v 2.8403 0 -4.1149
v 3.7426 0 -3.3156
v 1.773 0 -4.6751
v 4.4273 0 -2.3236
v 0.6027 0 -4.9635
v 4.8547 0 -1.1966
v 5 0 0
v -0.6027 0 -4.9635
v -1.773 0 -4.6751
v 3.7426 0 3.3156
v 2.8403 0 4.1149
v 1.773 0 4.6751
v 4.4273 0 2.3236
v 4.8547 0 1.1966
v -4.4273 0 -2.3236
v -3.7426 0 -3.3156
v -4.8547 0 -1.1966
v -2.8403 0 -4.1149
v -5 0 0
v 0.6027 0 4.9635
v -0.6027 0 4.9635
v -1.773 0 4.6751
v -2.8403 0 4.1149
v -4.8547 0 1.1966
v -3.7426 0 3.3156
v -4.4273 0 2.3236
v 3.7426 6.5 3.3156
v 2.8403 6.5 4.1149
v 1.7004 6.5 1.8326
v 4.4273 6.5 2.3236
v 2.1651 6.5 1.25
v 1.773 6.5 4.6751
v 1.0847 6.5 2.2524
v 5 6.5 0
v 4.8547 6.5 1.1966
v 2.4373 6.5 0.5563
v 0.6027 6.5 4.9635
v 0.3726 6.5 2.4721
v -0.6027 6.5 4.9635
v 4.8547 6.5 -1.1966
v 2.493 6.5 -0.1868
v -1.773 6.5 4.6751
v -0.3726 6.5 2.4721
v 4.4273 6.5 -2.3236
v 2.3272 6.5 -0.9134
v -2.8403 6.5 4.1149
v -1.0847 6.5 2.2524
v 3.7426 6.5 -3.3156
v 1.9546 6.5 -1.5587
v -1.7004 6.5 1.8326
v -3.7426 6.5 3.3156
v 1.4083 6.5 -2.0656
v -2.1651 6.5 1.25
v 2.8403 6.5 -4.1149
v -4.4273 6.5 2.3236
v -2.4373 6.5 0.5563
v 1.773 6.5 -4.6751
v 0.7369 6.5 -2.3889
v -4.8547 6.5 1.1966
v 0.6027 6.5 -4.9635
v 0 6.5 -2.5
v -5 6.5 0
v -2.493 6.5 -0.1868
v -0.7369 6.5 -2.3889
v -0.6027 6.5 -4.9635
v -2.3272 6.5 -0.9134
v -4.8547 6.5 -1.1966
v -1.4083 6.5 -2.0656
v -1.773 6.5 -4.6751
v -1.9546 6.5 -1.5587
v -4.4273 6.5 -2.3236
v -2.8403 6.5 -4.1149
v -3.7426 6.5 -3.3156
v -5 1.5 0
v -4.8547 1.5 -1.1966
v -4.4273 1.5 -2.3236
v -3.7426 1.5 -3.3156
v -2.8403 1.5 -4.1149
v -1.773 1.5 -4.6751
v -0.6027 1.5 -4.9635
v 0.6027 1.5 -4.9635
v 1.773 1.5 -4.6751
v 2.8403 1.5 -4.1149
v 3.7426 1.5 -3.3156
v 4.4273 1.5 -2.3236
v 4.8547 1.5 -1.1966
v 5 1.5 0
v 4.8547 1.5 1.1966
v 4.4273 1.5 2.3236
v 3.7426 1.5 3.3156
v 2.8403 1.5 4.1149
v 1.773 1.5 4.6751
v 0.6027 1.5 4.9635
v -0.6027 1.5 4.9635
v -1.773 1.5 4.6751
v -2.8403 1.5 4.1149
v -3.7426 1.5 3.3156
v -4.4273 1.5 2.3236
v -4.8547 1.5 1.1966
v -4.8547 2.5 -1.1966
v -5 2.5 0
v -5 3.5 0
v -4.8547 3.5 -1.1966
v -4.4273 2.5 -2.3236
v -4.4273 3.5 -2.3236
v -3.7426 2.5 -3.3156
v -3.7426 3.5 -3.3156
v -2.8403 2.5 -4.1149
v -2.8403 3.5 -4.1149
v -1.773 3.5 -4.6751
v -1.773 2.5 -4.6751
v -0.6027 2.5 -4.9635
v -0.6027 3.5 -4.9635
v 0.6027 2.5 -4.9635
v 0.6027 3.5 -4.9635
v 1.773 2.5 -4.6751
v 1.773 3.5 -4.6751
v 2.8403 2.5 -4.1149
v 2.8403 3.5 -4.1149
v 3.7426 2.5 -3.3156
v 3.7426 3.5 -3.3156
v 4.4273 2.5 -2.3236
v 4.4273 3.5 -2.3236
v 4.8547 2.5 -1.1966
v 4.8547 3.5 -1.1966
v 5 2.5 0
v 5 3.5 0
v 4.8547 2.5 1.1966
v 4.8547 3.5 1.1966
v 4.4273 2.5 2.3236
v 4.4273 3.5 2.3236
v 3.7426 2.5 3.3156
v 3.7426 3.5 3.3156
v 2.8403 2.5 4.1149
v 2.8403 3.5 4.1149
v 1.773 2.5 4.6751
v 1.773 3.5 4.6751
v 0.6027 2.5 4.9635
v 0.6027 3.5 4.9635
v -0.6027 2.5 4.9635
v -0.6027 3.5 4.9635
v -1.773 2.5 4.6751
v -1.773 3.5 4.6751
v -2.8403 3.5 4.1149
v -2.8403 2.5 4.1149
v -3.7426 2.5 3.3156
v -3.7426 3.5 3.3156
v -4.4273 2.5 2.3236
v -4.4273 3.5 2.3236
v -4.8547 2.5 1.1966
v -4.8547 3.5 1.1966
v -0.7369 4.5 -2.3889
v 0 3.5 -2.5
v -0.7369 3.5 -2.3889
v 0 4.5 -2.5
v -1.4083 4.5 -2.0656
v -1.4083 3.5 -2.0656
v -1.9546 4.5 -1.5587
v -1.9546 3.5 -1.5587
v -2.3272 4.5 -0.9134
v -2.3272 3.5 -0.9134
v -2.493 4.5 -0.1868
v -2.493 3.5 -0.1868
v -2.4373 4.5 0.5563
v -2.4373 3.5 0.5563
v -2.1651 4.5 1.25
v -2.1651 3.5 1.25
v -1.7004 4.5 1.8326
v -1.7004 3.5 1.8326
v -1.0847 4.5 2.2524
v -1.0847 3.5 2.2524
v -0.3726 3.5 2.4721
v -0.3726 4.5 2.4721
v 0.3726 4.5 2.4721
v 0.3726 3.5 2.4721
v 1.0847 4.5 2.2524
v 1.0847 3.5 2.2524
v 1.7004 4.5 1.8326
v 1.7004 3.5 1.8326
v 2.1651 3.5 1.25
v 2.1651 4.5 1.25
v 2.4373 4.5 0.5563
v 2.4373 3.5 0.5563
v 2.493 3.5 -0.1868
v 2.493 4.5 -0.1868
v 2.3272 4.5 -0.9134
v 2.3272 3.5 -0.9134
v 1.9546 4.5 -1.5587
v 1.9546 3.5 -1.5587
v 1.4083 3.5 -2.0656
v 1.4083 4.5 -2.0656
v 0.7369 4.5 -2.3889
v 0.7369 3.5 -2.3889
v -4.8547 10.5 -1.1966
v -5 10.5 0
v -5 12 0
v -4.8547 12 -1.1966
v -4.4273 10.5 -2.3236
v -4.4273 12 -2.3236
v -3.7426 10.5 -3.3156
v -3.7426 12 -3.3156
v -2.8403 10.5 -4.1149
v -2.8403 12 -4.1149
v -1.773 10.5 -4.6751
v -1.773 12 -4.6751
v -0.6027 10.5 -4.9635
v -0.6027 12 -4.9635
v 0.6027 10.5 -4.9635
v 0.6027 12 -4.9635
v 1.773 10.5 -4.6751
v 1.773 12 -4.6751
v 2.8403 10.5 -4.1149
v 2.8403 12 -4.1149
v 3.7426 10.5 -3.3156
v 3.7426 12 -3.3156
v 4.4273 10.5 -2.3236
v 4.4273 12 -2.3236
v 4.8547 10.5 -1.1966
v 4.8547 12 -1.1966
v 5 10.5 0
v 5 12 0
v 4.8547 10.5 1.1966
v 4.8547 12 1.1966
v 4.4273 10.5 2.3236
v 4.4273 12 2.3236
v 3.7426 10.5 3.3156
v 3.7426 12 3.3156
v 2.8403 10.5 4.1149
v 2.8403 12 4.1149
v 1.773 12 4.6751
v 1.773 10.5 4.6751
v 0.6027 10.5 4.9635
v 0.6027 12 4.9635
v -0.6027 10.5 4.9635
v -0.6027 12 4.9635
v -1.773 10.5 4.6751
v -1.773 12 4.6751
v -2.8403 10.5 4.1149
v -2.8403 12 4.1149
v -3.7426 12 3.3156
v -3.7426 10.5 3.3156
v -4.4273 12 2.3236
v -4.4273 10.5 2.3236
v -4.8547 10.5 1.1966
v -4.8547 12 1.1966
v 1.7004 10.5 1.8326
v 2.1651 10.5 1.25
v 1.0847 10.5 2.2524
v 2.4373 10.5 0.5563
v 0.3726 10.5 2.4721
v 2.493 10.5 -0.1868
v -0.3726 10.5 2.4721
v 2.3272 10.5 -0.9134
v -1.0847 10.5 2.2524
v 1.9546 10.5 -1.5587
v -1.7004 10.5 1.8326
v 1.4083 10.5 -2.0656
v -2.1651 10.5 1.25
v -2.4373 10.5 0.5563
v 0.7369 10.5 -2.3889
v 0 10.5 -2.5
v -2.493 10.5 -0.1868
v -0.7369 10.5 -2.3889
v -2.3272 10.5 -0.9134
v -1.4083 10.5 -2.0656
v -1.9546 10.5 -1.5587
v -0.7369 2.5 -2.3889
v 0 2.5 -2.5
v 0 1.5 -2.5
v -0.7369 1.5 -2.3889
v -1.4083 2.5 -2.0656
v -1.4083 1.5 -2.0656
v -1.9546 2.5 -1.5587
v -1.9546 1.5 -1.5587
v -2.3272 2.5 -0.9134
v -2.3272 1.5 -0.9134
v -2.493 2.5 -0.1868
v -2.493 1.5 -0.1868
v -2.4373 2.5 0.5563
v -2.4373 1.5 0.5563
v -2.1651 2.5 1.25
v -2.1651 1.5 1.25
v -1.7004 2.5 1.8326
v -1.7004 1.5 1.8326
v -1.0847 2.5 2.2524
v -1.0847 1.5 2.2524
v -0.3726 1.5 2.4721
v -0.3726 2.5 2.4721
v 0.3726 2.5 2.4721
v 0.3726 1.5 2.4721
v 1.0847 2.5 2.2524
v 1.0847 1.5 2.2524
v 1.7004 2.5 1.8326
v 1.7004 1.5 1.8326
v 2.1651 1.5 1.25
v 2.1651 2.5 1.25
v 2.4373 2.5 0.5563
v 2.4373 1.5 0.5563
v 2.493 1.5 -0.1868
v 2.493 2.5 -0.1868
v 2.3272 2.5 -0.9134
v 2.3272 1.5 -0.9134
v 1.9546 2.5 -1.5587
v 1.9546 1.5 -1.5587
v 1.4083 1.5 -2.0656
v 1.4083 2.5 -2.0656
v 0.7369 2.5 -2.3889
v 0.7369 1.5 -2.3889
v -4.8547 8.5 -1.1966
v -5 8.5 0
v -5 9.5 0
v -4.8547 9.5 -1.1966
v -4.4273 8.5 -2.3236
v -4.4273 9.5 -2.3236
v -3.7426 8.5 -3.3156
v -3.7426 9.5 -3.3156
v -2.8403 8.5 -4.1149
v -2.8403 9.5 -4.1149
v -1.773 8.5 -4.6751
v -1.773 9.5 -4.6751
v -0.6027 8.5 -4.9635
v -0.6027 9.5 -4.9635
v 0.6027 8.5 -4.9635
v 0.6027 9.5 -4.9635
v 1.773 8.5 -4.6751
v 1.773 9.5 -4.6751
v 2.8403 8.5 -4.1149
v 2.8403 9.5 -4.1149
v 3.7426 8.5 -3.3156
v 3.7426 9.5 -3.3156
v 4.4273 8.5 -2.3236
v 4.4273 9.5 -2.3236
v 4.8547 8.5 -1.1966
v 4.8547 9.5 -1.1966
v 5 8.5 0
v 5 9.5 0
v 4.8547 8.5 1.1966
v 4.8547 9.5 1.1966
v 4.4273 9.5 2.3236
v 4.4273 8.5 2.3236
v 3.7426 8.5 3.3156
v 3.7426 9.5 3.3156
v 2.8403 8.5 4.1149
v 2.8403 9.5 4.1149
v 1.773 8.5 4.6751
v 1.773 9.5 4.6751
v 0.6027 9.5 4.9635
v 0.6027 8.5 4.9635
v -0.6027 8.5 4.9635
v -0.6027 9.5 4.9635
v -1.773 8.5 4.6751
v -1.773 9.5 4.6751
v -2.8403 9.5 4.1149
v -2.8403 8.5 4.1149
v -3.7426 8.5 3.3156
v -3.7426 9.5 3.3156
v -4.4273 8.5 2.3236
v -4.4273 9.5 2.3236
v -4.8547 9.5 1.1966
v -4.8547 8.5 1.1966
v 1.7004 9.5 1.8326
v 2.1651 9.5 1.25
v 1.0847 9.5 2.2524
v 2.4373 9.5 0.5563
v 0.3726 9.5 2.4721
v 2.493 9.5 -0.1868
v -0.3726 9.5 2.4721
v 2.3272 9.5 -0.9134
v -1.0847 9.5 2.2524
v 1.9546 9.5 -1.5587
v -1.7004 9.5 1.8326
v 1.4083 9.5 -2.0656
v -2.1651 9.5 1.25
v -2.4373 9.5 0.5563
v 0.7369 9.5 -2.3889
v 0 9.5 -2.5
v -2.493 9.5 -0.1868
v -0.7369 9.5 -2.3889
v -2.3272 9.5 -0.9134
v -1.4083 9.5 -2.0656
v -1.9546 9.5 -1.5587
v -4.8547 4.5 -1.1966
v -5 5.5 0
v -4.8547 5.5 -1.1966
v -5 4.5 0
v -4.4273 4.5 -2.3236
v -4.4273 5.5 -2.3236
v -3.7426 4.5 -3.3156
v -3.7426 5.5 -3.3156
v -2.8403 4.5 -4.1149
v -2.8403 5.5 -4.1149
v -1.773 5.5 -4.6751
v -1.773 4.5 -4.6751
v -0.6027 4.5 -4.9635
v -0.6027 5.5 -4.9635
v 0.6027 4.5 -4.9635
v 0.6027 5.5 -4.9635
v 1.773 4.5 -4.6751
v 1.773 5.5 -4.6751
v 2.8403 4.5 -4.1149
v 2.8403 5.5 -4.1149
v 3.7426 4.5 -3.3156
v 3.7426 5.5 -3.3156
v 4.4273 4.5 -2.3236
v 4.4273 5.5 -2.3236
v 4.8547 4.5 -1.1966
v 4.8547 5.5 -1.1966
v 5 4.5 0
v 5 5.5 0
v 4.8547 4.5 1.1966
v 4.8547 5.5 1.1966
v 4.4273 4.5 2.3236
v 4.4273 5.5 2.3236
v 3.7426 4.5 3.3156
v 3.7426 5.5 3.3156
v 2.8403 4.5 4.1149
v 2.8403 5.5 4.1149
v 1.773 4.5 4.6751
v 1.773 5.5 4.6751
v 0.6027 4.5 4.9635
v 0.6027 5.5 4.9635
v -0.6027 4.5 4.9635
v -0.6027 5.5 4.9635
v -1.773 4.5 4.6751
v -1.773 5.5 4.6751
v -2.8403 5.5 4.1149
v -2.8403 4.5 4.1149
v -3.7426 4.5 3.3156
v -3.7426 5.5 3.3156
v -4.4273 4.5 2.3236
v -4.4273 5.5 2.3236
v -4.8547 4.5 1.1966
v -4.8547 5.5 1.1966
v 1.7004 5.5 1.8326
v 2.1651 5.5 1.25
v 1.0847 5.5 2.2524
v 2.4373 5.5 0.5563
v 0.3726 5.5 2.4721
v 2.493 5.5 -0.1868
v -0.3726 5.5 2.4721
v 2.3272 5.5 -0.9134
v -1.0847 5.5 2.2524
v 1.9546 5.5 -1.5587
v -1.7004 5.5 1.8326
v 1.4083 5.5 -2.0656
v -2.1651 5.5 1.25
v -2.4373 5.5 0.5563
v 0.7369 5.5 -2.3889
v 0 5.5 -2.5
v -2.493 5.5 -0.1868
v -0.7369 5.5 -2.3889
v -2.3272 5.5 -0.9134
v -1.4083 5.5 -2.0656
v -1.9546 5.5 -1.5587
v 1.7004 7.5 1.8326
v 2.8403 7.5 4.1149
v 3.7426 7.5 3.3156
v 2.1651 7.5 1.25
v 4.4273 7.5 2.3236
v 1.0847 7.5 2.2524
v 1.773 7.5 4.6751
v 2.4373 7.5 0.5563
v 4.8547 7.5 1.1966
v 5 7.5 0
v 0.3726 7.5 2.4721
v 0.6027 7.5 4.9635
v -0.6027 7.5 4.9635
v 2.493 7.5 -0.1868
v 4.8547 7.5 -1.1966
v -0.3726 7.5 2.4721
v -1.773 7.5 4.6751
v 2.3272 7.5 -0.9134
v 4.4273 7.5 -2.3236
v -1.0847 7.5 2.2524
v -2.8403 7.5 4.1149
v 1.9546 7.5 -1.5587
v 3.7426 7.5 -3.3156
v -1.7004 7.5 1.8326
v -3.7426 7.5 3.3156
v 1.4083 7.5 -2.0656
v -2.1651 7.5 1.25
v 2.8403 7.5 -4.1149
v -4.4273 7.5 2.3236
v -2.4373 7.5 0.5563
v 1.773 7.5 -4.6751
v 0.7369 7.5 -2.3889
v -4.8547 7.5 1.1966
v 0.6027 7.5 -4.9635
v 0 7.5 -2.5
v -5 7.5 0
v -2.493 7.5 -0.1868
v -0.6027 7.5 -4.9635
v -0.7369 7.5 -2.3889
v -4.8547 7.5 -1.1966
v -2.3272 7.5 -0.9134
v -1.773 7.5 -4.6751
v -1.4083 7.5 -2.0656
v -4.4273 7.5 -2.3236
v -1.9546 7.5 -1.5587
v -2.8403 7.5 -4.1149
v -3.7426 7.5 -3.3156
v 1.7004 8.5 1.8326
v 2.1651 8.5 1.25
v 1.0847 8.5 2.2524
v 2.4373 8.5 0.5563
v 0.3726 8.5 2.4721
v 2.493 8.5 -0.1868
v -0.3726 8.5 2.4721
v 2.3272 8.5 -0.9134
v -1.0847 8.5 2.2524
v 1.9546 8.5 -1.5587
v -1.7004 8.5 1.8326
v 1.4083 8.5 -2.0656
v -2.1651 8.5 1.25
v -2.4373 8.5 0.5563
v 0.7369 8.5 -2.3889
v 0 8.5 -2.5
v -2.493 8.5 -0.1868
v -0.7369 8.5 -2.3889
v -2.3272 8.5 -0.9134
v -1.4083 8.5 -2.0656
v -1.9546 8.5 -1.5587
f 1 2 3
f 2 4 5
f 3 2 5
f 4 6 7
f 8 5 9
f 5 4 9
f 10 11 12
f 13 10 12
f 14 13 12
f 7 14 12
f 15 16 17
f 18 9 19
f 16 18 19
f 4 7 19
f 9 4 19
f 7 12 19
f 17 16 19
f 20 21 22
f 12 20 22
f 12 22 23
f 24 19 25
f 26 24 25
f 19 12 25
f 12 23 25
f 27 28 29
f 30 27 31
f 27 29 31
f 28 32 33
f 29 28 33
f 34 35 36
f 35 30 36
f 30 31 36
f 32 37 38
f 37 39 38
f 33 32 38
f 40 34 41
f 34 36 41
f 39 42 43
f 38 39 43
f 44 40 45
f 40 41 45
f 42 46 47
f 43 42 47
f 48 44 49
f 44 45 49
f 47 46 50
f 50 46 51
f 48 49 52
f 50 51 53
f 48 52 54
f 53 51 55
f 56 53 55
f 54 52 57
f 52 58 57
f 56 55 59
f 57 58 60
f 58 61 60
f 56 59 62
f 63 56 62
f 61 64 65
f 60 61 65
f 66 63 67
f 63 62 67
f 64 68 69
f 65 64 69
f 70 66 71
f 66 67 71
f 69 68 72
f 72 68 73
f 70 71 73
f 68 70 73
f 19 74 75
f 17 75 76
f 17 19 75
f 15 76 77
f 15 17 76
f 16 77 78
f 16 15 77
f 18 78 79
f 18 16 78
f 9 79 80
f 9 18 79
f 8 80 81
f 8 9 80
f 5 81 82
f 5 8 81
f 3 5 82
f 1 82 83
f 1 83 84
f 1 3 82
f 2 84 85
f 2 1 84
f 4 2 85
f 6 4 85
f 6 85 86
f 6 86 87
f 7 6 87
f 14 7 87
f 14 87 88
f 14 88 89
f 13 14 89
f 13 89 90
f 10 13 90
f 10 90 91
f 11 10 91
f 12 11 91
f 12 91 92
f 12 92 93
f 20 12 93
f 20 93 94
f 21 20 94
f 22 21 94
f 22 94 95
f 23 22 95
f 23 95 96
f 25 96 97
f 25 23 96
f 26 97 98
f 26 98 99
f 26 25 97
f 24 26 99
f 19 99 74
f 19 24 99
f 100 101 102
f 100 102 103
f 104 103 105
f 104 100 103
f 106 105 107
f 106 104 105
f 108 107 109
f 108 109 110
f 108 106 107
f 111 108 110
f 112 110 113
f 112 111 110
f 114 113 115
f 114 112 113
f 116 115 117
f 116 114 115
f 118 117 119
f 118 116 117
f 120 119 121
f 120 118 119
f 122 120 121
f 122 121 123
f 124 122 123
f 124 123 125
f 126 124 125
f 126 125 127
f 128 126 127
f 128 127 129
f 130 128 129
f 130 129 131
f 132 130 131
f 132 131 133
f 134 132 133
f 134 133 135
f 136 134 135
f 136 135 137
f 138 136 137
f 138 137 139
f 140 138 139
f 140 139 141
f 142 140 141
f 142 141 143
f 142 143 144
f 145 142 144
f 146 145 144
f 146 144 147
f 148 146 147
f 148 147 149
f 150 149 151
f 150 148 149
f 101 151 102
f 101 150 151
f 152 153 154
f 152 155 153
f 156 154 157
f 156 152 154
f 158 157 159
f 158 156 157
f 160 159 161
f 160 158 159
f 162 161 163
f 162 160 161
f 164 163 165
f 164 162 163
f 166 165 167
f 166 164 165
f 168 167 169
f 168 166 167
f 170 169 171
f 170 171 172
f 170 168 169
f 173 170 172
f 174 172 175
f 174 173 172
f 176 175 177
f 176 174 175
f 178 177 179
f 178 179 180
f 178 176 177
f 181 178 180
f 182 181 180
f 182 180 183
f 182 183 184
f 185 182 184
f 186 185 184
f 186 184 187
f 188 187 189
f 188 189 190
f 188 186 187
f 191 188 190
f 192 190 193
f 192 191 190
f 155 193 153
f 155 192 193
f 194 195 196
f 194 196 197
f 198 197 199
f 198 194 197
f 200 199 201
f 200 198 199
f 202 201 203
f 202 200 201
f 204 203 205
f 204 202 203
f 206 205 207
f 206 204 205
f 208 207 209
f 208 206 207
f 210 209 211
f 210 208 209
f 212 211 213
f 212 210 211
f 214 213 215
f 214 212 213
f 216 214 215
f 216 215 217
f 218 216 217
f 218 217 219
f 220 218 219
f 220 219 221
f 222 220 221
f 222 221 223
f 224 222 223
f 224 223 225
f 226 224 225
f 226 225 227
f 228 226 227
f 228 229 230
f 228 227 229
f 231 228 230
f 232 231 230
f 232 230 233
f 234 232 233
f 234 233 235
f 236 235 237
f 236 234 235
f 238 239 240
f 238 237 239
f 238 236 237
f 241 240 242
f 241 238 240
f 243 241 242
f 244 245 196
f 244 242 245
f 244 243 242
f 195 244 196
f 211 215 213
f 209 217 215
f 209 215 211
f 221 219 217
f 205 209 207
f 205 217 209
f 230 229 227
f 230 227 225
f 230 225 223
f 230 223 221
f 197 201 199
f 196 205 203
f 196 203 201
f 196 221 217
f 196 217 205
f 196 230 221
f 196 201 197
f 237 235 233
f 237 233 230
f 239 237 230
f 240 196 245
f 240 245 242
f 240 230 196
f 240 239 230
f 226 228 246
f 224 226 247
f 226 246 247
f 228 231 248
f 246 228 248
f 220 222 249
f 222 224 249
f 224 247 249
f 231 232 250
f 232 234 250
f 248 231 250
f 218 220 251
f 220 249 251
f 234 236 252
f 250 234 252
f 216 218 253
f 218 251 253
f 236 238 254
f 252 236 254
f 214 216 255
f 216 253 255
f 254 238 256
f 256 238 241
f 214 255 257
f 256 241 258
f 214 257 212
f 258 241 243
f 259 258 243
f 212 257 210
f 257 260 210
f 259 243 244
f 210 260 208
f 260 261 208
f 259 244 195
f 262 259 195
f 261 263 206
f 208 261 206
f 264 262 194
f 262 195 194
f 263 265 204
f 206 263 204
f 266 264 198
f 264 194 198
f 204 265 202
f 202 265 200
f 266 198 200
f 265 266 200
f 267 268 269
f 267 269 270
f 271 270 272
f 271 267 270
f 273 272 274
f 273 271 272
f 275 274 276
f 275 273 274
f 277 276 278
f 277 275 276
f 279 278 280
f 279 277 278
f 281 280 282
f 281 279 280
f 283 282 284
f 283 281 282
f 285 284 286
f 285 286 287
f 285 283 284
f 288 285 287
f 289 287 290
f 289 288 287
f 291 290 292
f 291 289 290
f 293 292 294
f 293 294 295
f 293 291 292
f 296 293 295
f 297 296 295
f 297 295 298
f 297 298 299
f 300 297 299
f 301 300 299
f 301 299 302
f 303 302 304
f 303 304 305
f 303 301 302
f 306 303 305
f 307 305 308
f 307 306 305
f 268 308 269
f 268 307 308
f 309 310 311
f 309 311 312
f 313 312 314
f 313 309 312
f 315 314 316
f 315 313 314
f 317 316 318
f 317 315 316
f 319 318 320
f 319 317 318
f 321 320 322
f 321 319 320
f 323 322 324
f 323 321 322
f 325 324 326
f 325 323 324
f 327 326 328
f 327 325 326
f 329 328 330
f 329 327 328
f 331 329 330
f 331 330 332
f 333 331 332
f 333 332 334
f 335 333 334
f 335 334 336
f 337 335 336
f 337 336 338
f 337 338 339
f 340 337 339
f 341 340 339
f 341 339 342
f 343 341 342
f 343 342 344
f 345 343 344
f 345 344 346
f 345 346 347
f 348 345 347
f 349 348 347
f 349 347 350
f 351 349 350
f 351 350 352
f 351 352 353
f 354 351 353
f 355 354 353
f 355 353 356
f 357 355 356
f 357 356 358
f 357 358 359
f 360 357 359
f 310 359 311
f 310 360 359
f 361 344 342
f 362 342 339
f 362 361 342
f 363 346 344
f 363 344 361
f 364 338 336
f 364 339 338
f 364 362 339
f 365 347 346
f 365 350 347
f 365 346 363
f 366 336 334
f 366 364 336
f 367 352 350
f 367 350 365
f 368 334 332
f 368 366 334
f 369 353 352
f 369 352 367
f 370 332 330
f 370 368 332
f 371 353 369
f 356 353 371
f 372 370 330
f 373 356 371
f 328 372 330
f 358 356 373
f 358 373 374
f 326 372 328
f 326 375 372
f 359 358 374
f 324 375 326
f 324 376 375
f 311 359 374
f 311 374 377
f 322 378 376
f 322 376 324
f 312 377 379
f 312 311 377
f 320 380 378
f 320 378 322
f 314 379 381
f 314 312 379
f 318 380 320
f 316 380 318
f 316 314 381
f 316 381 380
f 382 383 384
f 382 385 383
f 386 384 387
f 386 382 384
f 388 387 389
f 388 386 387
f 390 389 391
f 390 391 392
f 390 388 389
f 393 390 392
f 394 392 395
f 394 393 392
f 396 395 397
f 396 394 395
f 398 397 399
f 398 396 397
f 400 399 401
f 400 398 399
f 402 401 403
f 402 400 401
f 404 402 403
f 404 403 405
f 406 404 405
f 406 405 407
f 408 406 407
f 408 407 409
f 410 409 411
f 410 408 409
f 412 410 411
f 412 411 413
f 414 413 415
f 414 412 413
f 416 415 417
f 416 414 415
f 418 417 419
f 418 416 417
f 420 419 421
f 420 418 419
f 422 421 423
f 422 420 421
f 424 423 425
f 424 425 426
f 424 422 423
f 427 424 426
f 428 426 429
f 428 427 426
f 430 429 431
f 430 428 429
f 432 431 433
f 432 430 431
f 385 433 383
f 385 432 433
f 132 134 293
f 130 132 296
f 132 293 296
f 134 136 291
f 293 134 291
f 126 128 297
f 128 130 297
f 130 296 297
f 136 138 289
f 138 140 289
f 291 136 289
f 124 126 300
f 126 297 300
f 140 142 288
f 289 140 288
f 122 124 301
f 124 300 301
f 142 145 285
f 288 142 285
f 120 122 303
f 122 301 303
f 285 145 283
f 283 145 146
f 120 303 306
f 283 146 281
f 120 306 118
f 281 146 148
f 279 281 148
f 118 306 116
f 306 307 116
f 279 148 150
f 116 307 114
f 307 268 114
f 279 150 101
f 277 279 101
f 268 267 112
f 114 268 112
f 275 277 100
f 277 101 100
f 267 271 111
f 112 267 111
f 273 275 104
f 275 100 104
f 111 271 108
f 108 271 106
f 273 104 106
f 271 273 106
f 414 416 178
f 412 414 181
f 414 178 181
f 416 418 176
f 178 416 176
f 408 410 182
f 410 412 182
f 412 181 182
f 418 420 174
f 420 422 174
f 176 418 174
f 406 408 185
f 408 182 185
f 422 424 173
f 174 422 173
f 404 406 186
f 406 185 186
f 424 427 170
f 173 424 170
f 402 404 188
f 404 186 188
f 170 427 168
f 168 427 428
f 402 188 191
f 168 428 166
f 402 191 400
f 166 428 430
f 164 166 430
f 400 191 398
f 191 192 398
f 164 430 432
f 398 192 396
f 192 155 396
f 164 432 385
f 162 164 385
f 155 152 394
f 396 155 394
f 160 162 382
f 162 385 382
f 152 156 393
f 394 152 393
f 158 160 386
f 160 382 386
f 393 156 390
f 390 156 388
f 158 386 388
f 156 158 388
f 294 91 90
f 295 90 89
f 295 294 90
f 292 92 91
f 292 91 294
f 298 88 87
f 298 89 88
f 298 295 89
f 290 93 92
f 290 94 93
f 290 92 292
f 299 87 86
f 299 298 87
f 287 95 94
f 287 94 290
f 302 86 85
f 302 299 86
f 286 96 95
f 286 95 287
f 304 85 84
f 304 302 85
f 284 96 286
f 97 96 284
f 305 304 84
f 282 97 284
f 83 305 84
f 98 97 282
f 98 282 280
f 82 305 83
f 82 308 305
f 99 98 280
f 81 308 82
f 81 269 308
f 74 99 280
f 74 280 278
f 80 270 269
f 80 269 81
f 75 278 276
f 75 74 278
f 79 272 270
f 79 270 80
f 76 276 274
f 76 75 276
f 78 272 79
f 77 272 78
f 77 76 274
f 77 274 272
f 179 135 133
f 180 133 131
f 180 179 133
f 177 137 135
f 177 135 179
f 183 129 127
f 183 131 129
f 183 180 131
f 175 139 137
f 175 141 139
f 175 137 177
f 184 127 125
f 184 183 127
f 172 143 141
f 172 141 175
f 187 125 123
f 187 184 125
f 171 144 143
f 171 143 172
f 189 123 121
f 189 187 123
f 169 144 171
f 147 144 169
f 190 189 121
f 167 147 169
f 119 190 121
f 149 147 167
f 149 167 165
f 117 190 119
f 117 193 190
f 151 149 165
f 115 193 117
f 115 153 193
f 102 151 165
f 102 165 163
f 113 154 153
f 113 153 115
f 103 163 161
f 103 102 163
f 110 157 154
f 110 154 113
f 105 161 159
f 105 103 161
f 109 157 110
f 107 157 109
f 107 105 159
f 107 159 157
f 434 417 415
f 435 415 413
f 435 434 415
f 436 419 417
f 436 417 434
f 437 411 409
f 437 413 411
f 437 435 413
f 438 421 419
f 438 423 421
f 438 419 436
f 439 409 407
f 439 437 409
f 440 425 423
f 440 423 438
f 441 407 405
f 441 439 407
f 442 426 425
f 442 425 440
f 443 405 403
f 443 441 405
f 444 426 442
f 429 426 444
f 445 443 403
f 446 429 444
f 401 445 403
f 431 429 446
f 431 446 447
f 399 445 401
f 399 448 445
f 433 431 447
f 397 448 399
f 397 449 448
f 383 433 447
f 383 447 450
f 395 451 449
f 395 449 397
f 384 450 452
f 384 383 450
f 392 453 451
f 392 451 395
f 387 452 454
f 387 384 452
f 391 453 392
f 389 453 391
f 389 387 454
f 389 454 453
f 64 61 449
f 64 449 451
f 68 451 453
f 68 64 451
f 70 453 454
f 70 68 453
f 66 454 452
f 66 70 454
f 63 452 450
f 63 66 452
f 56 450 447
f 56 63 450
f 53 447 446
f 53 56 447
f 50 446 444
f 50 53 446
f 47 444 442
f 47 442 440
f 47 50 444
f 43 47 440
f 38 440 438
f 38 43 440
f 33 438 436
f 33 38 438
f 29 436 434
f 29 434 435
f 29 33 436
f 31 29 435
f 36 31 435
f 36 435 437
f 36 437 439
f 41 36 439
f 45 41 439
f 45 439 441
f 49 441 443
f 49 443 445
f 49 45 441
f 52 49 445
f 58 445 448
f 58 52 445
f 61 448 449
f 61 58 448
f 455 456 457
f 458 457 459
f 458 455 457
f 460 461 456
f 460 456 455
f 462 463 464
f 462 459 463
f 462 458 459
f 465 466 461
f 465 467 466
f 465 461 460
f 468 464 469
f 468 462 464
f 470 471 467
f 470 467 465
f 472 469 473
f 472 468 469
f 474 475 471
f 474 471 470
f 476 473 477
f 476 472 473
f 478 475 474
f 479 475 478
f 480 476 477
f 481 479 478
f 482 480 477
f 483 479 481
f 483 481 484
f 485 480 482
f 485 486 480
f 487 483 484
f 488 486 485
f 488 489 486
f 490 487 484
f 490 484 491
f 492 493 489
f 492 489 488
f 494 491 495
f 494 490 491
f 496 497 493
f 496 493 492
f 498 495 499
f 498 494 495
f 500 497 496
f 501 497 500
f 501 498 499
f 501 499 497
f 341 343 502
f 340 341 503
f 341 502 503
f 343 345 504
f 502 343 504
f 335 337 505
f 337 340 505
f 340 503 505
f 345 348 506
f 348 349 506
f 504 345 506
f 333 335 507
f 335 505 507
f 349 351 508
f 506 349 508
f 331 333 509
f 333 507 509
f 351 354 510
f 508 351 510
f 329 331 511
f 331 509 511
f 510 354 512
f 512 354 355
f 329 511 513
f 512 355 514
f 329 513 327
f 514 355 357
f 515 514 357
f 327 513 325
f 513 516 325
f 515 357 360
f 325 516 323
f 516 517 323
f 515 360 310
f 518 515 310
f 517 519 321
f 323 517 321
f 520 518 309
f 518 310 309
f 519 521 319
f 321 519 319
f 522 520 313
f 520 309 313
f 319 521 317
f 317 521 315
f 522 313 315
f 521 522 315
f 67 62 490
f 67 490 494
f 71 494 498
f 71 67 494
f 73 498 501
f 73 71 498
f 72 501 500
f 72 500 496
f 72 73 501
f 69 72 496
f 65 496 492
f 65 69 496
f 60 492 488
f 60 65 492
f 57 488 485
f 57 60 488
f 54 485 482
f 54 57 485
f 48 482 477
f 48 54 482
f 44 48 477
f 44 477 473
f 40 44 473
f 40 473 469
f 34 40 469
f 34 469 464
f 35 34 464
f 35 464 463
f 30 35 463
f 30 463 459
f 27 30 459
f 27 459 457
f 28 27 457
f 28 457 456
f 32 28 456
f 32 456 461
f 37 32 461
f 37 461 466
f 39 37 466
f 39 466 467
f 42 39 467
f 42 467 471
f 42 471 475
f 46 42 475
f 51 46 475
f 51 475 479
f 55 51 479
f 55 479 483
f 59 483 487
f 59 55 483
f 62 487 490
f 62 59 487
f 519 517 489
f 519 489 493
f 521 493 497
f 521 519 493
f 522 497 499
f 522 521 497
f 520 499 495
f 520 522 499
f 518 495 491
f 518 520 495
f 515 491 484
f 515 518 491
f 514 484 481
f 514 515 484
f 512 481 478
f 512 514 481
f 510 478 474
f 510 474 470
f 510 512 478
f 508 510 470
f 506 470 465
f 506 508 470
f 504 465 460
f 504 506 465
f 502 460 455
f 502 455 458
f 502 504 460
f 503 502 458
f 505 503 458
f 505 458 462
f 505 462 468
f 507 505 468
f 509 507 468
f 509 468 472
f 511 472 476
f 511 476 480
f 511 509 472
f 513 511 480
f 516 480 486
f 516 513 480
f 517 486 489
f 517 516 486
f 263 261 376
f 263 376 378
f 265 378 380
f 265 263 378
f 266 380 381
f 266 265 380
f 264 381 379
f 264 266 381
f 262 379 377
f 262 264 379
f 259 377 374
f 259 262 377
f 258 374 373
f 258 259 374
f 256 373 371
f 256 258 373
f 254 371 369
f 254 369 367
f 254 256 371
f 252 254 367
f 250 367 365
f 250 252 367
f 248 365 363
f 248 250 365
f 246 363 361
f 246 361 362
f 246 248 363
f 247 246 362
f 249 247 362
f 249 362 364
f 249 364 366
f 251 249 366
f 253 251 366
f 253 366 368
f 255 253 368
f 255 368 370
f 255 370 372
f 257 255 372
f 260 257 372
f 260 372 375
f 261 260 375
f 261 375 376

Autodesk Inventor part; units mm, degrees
ref_plane "YZ Plane" through (0, 0, 0) normal (1, 0, 0) x (0, 1, 0)
ref_plane "XZ Plane" through (0, 0, 0) normal (0, 1, 0) x (-1, 0, 0)
ref_plane "XY Plane" through (0, 0, 0) normal (0, 0, 1) x (1, 0, 0)
sketch "Sketch1" plane through (0, 0, 0) normal (0, 1, 0) x (-1, 0, 0)
  circle A0 centre (0, 0) radius 5
  dimension "d0" = 10
extrude "Extrusion1" add sketch "Sketch1" along normal blind 12
sketch "Sketch2" plane through (0, 0, 0) normal (1, 0, 0) x (0, 1, 0)
  line L0 (1.5, -2.5) -> (2.5, -2.5)
  line L1 (2.5, -2.5) -> (2.5, -7.5)
  line L2 (2.5, -7.5) -> (1.5, -7.5)
  line L3 (1.5, -7.5) -> (1.5, -2.5)
  line L4 (0, -5) -> (12, -5) projected
  line L5 (1.5, -2.5) -> (2.5, -7.5) construction
  line L6 (2.5, -2.5) -> (1.5, -7.5) construction
  line L7 (0, 0) -> (12, 0)
  line L8 (12, -5) -> (12, 5) projected
  line L9 (0, -10) -> (0, 7.5) projected
  line L10 (-2.4, 0) -> (14.4, 0) projected
  point P0 (2, -5)
  dimension "d3" = 1
  dimension "d4" = 5
  dimension "d9" = 2
revolve "Revolution1" cut sketch "Sketch2" angle 360 about axis through (0, 0, 0) along (0, 1, 0) contours L0 L1 L4 L3 | L4 L1 L2 L3
pattern_linear "Rectangular Pattern1" count 5 spacing 2 along (0, 1, 0) of "Revolution1"
properties part number "Ceramic_Spacer"
